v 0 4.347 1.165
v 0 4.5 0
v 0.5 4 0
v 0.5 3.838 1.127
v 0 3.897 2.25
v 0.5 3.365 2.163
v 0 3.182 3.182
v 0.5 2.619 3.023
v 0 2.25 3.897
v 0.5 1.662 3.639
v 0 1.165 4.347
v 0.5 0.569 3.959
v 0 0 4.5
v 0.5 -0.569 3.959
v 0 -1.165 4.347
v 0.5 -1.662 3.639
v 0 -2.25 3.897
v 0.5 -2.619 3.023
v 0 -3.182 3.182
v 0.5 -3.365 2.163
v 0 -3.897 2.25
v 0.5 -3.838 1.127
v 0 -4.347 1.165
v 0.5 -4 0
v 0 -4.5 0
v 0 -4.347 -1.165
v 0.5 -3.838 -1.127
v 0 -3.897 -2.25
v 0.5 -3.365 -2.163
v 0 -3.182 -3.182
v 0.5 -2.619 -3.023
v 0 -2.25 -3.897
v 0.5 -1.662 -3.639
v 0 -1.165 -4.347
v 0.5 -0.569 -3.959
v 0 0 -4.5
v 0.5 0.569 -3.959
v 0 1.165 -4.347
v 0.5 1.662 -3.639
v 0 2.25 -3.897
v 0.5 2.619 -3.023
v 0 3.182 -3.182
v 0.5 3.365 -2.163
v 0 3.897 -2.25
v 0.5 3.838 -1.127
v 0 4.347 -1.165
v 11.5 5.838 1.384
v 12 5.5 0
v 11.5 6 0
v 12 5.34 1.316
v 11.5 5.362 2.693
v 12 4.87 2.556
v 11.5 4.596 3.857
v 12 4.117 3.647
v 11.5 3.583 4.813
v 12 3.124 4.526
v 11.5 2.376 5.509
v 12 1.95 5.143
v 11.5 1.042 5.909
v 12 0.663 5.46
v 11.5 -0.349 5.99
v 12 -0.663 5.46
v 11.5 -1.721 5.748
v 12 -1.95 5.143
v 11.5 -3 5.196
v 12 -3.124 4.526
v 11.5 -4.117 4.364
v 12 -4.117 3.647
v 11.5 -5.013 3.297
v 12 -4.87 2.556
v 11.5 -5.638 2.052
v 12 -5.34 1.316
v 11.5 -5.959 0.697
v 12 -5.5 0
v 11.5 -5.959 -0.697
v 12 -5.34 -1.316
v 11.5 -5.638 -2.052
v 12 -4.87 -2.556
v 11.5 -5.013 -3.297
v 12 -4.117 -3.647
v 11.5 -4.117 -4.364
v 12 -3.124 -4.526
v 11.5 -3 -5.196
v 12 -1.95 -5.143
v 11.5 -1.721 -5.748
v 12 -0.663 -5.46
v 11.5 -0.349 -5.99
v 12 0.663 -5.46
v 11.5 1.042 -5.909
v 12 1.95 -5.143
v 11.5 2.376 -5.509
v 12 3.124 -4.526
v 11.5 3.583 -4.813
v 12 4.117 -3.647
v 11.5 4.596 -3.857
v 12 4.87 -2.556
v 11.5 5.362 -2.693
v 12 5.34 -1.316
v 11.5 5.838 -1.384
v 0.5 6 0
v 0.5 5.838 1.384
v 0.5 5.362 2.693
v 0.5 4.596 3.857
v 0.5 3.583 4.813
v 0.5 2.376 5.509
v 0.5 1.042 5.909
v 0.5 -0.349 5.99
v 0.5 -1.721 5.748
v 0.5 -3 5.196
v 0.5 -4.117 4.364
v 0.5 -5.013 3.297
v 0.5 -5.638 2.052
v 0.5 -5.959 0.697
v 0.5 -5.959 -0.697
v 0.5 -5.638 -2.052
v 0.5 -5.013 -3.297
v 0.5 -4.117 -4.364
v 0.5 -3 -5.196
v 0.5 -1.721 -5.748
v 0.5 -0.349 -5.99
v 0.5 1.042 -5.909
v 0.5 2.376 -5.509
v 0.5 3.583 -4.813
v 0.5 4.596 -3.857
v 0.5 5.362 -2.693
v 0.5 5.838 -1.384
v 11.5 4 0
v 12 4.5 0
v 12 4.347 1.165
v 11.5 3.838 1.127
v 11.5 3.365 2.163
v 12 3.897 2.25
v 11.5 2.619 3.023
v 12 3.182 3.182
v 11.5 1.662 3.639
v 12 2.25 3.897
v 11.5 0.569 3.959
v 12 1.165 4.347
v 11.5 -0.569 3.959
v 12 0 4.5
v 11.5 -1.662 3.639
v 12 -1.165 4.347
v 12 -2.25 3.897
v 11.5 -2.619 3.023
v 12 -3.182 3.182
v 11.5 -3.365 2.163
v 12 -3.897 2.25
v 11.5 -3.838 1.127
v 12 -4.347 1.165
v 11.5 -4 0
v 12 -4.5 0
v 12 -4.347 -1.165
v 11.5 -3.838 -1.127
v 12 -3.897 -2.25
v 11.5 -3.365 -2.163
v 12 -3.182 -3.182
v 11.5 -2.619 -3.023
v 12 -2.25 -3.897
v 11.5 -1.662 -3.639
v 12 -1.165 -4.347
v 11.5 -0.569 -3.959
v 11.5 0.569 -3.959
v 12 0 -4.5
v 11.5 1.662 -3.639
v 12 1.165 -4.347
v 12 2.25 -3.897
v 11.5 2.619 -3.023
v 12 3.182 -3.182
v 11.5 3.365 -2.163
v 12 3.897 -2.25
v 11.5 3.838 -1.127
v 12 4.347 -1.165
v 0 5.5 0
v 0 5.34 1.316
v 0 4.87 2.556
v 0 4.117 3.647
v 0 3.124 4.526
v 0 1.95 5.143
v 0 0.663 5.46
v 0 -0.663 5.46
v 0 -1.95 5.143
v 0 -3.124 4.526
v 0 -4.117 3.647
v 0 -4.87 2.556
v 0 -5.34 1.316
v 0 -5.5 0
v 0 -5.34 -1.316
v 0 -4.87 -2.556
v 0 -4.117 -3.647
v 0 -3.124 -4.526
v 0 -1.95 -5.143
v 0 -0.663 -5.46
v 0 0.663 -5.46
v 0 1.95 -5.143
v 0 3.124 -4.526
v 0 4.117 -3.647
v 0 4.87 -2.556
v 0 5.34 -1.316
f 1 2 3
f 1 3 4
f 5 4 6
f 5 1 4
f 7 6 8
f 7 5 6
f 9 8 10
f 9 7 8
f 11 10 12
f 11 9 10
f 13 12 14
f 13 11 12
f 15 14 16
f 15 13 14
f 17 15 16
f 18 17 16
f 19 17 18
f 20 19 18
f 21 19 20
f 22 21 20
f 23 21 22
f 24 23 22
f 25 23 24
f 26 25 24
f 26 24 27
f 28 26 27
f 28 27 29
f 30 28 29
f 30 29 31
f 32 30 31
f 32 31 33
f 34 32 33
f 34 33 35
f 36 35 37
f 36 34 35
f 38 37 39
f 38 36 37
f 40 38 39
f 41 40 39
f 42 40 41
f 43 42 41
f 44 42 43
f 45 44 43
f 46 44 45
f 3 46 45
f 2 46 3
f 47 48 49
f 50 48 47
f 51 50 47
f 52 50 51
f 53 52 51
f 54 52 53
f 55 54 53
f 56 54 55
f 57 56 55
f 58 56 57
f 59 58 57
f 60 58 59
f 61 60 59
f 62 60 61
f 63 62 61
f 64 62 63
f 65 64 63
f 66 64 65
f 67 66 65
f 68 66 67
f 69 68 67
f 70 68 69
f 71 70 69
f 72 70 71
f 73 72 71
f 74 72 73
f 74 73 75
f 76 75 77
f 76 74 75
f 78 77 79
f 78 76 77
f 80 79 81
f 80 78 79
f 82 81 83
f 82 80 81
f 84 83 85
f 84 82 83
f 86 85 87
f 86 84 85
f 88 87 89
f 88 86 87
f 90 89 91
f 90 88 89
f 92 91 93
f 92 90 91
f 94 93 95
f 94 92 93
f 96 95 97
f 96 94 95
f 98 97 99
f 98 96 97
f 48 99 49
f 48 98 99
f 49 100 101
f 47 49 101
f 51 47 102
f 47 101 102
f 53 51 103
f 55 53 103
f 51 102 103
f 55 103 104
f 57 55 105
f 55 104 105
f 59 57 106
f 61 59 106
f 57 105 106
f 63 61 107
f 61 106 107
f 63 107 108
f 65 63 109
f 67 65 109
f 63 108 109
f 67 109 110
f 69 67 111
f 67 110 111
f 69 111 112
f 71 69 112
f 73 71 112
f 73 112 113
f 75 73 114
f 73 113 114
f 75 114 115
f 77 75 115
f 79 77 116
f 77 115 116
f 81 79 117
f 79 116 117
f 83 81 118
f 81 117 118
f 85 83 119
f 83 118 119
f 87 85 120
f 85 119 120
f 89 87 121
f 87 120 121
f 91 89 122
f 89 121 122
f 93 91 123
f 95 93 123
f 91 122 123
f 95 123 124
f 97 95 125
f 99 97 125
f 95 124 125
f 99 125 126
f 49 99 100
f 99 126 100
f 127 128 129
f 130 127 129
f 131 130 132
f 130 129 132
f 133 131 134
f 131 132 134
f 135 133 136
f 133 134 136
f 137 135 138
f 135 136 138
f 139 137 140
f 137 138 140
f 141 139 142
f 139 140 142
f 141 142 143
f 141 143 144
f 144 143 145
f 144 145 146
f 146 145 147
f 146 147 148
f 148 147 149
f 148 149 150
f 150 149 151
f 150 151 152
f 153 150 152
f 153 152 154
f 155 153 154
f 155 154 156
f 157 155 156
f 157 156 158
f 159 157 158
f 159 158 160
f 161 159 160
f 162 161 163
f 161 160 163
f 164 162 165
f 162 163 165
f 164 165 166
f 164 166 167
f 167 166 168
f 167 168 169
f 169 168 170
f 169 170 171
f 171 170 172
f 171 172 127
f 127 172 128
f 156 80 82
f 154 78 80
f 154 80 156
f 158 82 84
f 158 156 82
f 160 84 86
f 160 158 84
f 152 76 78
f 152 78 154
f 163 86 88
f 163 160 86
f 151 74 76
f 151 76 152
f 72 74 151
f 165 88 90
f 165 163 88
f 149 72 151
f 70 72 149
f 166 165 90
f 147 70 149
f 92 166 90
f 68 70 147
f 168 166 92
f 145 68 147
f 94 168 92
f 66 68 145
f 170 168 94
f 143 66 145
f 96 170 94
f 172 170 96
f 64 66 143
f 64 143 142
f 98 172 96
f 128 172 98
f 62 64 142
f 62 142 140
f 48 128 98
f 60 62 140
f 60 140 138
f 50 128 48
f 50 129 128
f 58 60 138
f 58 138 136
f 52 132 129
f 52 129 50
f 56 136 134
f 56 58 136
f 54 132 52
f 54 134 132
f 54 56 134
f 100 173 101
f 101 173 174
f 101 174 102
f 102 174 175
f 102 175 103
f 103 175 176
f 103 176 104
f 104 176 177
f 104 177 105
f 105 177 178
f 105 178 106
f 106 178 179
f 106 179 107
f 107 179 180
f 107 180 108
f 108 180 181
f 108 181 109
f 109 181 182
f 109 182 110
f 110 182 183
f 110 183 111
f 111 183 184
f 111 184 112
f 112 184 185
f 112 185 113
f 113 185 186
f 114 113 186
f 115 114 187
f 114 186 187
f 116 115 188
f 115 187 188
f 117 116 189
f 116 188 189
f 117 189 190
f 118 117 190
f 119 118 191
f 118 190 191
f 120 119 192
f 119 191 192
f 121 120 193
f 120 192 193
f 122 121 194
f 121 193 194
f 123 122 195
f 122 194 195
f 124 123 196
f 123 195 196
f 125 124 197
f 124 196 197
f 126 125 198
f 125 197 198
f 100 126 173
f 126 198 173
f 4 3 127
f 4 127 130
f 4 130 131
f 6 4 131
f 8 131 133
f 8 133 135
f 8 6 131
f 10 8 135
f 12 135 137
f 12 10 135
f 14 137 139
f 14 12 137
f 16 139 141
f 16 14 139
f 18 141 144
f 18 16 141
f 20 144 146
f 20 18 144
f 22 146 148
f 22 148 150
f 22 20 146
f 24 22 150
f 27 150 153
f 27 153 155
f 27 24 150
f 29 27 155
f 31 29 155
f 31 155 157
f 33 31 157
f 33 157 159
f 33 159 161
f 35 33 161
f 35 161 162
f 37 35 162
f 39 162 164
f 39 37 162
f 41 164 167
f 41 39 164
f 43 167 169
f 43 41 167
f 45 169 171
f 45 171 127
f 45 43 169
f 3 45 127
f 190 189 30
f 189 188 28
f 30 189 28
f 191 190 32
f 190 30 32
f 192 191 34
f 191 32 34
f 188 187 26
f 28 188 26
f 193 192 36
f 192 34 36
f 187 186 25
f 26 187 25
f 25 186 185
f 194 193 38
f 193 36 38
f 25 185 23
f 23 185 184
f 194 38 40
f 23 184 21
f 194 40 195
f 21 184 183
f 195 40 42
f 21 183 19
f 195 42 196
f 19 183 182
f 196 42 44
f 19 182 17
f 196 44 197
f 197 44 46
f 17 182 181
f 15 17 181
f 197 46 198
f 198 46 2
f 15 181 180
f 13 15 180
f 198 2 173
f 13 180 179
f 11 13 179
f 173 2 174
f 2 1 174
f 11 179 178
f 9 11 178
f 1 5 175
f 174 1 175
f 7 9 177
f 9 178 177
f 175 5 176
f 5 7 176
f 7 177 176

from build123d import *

# Parameters (mm, degrees)
F0_R     = 6
F0_R_2   = 4
F1_DEPTH = 12
F2_SIZE  = 0.5


with BuildPart() as f1:
    # F0 (on Right) → F1 (new body)
    with BuildSketch(Plane.YZ):
        Circle(F0_R)
        Circle(F0_R_2, mode=Mode.SUBTRACT)
    extrude(amount=F1_DEPTH)

    # F2
    f2_edges = [f1.edges().sort_by_distance(p)[0] for p in [
        (12, -6, 0),
        (12, -4, 0),
        (0, -6, 0),
        (0, -4, 0),
    ]]
    chamfer(f2_edges, length=F2_SIZE)


solid = f1.part
